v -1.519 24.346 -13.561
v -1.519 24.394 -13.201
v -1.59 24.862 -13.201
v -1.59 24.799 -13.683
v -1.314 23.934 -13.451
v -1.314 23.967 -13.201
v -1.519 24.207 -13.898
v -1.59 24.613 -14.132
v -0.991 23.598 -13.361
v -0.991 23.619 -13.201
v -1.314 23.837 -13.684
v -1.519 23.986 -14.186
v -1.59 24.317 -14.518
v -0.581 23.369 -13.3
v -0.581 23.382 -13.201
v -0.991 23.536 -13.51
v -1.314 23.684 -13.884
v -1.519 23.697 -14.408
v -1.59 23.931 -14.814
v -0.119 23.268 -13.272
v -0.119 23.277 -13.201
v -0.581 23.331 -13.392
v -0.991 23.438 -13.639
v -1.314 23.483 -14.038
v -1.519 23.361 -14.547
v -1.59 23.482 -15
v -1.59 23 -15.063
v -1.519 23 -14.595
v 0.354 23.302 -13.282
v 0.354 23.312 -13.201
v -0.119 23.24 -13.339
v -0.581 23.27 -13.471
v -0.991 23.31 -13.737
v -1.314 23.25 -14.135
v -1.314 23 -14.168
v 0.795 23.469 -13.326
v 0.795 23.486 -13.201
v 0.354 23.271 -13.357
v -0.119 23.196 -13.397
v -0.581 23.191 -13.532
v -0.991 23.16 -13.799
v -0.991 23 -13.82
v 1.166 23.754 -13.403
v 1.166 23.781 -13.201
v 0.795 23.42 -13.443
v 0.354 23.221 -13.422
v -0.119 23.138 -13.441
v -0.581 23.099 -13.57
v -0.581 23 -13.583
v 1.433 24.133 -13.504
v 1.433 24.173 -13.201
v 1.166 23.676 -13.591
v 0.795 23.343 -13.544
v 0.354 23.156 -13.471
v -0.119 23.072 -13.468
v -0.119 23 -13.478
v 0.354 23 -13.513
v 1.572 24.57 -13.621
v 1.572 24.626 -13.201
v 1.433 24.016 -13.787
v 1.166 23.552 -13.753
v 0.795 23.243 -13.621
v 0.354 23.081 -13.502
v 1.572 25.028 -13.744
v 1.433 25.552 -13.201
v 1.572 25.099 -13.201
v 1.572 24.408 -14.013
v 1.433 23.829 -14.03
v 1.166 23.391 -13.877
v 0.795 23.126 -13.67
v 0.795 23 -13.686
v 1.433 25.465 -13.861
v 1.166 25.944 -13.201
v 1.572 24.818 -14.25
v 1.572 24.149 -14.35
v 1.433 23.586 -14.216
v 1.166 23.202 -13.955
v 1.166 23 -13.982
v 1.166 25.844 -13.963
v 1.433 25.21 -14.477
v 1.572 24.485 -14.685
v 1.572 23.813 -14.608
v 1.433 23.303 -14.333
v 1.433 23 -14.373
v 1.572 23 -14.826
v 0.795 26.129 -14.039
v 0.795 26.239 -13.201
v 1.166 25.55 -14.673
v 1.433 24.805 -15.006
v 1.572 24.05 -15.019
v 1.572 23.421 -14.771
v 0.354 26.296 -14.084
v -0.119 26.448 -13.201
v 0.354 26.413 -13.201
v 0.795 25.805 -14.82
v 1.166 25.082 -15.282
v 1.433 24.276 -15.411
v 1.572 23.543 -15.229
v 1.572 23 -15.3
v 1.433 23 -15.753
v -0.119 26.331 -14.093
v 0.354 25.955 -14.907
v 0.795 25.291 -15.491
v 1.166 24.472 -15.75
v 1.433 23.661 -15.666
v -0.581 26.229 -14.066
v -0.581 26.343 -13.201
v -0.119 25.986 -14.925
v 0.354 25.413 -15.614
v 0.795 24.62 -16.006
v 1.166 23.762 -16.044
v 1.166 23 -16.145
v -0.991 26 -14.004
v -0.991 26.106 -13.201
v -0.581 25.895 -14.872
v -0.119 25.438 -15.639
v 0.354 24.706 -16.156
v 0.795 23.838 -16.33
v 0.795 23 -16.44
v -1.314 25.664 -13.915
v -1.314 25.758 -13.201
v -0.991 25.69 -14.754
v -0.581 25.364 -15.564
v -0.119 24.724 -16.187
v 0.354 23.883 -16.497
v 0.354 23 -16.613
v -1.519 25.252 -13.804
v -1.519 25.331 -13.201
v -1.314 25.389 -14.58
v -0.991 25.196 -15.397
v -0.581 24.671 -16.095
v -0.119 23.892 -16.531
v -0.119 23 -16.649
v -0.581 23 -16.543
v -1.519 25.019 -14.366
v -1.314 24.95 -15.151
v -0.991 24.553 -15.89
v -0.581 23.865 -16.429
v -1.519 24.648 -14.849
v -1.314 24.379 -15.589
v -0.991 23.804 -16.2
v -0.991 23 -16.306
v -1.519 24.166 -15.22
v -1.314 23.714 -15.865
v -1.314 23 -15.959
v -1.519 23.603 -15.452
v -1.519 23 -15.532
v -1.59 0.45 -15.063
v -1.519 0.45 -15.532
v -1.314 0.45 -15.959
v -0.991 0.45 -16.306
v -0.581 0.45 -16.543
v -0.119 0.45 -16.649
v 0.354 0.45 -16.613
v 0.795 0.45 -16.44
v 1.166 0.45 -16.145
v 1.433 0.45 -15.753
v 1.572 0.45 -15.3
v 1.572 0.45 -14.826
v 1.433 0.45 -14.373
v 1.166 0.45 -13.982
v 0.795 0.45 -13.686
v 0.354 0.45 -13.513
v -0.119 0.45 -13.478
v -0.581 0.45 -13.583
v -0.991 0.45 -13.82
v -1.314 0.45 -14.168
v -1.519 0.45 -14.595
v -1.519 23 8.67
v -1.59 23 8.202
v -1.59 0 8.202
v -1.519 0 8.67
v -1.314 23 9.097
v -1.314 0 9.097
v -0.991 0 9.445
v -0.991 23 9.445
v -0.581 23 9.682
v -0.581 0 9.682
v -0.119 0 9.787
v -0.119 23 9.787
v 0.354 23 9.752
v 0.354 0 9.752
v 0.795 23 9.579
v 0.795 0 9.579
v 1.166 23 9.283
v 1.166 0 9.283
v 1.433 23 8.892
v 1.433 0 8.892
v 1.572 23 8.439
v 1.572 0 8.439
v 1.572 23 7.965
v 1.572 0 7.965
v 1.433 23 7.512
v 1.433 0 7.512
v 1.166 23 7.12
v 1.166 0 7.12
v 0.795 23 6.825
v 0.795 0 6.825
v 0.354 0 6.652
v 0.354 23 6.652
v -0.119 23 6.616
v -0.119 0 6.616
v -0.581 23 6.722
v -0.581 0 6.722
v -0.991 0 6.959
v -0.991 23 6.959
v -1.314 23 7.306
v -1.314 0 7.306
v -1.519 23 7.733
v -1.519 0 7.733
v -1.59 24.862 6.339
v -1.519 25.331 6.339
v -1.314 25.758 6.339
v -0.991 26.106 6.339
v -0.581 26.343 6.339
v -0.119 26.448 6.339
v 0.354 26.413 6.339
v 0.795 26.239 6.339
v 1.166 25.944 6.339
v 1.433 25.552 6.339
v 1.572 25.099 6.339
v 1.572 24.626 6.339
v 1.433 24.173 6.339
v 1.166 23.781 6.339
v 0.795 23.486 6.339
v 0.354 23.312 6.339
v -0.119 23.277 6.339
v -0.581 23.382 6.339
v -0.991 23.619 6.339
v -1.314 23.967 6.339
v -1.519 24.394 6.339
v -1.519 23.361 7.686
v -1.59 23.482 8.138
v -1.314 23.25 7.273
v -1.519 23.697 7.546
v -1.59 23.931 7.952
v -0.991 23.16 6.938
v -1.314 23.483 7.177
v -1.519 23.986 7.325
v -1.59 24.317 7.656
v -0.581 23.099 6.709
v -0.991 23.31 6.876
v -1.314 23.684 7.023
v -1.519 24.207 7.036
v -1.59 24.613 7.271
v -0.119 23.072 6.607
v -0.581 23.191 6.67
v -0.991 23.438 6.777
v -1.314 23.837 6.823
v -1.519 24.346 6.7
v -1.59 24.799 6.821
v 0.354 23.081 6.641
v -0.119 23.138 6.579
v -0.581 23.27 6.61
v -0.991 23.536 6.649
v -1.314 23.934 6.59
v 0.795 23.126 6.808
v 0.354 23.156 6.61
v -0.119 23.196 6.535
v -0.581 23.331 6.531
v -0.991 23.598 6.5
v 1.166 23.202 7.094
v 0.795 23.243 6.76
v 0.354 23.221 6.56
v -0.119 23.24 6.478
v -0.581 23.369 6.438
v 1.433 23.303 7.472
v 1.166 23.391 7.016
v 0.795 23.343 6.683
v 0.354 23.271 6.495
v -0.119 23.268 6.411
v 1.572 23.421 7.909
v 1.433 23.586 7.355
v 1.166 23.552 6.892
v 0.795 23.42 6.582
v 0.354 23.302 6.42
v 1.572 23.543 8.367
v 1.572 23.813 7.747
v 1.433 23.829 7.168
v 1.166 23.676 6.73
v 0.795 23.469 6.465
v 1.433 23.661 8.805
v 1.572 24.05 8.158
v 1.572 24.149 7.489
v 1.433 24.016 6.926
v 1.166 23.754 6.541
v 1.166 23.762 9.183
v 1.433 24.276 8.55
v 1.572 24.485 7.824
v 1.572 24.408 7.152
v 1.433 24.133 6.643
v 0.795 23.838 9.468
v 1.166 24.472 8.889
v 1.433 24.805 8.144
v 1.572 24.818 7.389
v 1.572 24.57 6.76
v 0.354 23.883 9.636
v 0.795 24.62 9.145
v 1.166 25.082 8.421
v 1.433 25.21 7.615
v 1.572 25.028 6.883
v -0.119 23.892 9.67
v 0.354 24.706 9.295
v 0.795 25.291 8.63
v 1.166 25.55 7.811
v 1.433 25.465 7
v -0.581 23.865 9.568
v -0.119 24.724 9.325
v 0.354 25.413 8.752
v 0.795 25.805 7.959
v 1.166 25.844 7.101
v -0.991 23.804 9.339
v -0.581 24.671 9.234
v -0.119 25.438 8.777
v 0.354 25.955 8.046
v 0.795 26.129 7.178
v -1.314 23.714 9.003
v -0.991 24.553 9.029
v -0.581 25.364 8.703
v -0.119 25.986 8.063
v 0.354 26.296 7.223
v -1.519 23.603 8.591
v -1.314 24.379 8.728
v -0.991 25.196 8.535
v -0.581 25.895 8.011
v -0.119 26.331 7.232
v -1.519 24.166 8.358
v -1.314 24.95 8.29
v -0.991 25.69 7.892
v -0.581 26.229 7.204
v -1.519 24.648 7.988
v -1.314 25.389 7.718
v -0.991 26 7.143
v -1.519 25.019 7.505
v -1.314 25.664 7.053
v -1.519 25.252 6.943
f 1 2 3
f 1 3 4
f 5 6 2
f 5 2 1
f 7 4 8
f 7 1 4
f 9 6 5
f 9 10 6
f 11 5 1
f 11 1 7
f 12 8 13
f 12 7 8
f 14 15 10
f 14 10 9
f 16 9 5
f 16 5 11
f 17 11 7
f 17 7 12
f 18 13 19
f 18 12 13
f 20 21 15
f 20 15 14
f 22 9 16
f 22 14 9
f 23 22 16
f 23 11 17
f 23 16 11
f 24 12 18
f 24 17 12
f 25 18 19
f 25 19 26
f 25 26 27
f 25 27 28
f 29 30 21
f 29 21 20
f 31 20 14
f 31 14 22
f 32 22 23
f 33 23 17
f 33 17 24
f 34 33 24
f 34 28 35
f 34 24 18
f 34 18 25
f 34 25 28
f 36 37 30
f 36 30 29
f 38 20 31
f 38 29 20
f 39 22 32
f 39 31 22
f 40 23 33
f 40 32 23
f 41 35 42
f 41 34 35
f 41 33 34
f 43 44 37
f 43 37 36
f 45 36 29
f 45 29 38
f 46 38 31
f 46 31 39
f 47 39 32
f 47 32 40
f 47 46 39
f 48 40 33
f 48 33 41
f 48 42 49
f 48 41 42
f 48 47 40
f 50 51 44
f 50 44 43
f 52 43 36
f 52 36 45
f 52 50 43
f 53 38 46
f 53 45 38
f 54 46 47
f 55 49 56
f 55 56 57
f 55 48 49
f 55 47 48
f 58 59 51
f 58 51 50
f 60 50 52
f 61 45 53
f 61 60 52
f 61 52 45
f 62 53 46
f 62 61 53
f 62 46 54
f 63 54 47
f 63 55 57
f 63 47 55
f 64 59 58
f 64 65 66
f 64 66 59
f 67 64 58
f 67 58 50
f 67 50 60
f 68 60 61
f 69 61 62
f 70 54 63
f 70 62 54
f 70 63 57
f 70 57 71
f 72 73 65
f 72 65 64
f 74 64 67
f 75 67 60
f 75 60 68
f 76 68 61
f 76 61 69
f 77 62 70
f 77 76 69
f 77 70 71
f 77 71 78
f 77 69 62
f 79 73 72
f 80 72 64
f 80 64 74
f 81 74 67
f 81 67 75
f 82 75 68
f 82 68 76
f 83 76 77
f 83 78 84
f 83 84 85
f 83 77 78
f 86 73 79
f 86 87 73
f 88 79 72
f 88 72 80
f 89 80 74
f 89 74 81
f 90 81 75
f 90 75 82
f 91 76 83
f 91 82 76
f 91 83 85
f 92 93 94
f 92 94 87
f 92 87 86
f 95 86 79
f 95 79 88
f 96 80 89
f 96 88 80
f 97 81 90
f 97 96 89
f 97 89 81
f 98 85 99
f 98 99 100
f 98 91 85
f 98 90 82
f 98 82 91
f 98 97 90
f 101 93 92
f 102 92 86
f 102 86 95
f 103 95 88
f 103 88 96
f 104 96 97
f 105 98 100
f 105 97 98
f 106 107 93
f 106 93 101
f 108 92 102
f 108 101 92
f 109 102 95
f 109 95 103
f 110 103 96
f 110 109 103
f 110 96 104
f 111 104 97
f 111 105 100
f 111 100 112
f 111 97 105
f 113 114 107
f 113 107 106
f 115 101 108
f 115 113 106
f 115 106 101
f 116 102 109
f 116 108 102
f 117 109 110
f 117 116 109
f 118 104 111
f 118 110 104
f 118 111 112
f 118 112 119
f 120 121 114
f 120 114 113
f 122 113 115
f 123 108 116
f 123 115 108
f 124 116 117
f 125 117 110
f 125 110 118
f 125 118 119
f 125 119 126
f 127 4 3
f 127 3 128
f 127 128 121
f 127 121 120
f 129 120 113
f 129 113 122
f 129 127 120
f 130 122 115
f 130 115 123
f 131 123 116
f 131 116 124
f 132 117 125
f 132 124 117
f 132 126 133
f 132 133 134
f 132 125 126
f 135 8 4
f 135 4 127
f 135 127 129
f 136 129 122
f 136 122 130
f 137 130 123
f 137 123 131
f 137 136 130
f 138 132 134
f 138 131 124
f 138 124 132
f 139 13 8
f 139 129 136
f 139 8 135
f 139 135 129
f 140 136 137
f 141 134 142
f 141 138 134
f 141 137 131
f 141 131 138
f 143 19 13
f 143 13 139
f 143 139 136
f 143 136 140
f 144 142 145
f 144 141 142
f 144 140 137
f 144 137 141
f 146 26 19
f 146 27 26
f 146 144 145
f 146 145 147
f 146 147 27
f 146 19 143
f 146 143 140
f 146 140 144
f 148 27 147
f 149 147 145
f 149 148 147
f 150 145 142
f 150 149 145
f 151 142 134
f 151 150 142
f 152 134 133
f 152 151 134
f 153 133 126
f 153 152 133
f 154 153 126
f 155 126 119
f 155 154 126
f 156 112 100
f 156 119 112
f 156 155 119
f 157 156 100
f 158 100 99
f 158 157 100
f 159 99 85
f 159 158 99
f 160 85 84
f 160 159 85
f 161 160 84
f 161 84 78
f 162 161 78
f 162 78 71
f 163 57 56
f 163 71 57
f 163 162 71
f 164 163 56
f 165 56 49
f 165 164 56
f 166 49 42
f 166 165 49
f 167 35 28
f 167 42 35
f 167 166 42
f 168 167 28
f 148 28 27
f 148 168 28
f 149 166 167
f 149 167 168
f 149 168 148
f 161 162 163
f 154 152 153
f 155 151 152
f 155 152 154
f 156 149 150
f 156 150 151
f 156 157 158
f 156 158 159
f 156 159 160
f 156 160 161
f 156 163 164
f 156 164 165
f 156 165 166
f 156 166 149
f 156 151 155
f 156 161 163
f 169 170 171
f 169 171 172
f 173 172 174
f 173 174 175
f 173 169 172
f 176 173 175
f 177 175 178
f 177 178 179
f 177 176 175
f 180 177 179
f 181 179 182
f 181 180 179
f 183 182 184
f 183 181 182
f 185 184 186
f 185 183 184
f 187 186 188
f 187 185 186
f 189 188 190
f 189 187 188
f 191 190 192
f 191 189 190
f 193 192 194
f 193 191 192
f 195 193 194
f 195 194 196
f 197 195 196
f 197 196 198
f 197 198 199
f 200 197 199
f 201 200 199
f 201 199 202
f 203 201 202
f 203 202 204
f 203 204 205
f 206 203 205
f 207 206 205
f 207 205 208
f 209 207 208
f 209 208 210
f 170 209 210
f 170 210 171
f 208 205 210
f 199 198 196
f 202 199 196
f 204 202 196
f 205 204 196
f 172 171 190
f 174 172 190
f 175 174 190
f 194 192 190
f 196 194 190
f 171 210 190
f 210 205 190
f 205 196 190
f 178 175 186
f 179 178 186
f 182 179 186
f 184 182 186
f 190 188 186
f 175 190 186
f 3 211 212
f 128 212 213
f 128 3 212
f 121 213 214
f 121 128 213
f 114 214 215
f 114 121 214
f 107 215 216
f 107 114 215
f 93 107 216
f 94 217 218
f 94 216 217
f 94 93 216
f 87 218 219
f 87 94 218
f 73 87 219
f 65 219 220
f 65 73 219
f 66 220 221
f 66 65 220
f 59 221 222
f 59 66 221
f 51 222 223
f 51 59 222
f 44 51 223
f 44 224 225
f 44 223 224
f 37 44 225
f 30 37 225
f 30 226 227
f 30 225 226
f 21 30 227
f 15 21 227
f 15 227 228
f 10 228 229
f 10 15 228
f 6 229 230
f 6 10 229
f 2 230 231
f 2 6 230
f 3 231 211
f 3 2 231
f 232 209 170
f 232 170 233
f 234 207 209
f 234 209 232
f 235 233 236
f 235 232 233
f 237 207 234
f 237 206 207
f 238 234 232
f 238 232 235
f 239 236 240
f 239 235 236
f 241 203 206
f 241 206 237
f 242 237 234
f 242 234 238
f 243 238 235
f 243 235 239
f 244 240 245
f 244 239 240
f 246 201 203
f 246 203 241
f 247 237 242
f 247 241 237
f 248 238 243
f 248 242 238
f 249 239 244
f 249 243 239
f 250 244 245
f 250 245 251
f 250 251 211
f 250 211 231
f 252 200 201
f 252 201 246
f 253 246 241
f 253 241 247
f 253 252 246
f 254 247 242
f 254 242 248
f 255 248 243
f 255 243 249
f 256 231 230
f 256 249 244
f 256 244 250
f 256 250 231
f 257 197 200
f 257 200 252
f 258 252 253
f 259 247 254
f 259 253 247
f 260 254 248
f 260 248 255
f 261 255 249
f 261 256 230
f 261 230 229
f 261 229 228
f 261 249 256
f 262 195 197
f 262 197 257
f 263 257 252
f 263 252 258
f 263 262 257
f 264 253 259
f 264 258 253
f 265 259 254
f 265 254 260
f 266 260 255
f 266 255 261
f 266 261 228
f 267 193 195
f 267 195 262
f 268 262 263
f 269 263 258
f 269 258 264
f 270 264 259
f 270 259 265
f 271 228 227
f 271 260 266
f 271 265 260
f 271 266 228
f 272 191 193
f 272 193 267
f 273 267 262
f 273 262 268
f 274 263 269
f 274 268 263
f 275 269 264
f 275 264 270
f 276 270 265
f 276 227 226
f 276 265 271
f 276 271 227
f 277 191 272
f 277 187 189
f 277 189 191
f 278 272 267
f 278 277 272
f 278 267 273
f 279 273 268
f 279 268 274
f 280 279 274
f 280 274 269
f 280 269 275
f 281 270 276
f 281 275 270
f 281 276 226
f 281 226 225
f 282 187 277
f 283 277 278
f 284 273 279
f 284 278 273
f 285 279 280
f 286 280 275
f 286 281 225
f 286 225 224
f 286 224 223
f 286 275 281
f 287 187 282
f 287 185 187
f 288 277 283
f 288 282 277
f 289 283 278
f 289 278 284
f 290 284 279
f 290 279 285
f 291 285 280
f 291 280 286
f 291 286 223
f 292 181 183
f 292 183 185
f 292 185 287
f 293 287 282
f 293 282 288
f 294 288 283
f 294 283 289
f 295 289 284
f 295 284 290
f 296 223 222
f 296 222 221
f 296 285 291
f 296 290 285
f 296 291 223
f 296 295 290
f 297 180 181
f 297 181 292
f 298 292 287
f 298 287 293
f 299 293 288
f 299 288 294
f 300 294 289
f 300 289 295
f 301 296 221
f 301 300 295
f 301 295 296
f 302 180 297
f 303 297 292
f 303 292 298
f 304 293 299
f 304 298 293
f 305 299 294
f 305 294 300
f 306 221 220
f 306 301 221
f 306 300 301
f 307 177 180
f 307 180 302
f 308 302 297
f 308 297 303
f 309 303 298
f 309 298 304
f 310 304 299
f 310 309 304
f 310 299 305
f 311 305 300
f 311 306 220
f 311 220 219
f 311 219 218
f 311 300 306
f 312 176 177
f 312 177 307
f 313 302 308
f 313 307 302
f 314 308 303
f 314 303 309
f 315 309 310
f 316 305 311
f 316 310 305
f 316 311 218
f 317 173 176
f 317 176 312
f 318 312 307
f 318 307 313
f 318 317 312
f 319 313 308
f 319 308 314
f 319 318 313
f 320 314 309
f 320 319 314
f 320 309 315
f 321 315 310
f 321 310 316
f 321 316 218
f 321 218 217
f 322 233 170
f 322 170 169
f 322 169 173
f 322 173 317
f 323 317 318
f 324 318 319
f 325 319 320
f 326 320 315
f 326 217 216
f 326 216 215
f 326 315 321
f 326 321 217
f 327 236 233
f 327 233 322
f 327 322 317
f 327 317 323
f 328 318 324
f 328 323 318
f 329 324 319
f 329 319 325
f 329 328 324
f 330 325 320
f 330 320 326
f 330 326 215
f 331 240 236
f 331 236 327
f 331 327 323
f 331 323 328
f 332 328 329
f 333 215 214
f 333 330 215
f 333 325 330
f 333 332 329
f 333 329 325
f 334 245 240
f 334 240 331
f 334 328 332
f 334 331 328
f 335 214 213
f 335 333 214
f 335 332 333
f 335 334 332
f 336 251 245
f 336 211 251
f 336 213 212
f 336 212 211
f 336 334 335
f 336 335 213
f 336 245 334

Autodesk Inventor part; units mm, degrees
ref_plane "YZ Plane" through (0, 0, 0) normal (1, 0, 0) x (0, 1, 0)
ref_plane "XZ Plane" through (0, 0, 0) normal (0, 1, 0) x (-1, 0, 0)
ref_plane "XY Plane" through (0, 0, 0) normal (0, 0, 1) x (1, 0, 0)
sketch "Boceto1" plane through (0, 0, 0) normal (1, 0, 0) x (0, 1, 0)
  line L0 (0, 8.3393) -> (23, 8.3393)
  line L1 (25, 6.3393) -> (25, -13.2007)
  line L2 (23, -15.2007) -> (0.45, -15.2007)
  arc A0 (25, 6.3393) -> (23, 8.3393) centre (23, 6.3393) ccw
  arc A1 (23, -15.2007) -> (25, -13.2007) centre (23, -13.2007) ccw
  line L3 (0, 13.6272) -> (0, -20.4886) projected
  point P0 (0, 0)
  point P1 (25, 8.3393)
  point P2 (25, -15.2007)
  dimension "d0" = 25
  dimension "d2" = 23.54
  dimension "d6" = 2
  dimension "d8" = 24.55
  dimension "d9" = 25
sketch "Boceto2" plane through (0, 0, 0) normal (0, 1, 0) x (-1, 0, 0)
  circle A0 centre (0, 8.2018) radius 1.59
  point P0 (0, 0)
  dimension "d3" = 3.18
sweep "Barrido1" add profiles "Boceto2" path "Boceto1" path curves L0 A0 L1 A1 L2
properties part number "BRAZOS BAILARINA"
